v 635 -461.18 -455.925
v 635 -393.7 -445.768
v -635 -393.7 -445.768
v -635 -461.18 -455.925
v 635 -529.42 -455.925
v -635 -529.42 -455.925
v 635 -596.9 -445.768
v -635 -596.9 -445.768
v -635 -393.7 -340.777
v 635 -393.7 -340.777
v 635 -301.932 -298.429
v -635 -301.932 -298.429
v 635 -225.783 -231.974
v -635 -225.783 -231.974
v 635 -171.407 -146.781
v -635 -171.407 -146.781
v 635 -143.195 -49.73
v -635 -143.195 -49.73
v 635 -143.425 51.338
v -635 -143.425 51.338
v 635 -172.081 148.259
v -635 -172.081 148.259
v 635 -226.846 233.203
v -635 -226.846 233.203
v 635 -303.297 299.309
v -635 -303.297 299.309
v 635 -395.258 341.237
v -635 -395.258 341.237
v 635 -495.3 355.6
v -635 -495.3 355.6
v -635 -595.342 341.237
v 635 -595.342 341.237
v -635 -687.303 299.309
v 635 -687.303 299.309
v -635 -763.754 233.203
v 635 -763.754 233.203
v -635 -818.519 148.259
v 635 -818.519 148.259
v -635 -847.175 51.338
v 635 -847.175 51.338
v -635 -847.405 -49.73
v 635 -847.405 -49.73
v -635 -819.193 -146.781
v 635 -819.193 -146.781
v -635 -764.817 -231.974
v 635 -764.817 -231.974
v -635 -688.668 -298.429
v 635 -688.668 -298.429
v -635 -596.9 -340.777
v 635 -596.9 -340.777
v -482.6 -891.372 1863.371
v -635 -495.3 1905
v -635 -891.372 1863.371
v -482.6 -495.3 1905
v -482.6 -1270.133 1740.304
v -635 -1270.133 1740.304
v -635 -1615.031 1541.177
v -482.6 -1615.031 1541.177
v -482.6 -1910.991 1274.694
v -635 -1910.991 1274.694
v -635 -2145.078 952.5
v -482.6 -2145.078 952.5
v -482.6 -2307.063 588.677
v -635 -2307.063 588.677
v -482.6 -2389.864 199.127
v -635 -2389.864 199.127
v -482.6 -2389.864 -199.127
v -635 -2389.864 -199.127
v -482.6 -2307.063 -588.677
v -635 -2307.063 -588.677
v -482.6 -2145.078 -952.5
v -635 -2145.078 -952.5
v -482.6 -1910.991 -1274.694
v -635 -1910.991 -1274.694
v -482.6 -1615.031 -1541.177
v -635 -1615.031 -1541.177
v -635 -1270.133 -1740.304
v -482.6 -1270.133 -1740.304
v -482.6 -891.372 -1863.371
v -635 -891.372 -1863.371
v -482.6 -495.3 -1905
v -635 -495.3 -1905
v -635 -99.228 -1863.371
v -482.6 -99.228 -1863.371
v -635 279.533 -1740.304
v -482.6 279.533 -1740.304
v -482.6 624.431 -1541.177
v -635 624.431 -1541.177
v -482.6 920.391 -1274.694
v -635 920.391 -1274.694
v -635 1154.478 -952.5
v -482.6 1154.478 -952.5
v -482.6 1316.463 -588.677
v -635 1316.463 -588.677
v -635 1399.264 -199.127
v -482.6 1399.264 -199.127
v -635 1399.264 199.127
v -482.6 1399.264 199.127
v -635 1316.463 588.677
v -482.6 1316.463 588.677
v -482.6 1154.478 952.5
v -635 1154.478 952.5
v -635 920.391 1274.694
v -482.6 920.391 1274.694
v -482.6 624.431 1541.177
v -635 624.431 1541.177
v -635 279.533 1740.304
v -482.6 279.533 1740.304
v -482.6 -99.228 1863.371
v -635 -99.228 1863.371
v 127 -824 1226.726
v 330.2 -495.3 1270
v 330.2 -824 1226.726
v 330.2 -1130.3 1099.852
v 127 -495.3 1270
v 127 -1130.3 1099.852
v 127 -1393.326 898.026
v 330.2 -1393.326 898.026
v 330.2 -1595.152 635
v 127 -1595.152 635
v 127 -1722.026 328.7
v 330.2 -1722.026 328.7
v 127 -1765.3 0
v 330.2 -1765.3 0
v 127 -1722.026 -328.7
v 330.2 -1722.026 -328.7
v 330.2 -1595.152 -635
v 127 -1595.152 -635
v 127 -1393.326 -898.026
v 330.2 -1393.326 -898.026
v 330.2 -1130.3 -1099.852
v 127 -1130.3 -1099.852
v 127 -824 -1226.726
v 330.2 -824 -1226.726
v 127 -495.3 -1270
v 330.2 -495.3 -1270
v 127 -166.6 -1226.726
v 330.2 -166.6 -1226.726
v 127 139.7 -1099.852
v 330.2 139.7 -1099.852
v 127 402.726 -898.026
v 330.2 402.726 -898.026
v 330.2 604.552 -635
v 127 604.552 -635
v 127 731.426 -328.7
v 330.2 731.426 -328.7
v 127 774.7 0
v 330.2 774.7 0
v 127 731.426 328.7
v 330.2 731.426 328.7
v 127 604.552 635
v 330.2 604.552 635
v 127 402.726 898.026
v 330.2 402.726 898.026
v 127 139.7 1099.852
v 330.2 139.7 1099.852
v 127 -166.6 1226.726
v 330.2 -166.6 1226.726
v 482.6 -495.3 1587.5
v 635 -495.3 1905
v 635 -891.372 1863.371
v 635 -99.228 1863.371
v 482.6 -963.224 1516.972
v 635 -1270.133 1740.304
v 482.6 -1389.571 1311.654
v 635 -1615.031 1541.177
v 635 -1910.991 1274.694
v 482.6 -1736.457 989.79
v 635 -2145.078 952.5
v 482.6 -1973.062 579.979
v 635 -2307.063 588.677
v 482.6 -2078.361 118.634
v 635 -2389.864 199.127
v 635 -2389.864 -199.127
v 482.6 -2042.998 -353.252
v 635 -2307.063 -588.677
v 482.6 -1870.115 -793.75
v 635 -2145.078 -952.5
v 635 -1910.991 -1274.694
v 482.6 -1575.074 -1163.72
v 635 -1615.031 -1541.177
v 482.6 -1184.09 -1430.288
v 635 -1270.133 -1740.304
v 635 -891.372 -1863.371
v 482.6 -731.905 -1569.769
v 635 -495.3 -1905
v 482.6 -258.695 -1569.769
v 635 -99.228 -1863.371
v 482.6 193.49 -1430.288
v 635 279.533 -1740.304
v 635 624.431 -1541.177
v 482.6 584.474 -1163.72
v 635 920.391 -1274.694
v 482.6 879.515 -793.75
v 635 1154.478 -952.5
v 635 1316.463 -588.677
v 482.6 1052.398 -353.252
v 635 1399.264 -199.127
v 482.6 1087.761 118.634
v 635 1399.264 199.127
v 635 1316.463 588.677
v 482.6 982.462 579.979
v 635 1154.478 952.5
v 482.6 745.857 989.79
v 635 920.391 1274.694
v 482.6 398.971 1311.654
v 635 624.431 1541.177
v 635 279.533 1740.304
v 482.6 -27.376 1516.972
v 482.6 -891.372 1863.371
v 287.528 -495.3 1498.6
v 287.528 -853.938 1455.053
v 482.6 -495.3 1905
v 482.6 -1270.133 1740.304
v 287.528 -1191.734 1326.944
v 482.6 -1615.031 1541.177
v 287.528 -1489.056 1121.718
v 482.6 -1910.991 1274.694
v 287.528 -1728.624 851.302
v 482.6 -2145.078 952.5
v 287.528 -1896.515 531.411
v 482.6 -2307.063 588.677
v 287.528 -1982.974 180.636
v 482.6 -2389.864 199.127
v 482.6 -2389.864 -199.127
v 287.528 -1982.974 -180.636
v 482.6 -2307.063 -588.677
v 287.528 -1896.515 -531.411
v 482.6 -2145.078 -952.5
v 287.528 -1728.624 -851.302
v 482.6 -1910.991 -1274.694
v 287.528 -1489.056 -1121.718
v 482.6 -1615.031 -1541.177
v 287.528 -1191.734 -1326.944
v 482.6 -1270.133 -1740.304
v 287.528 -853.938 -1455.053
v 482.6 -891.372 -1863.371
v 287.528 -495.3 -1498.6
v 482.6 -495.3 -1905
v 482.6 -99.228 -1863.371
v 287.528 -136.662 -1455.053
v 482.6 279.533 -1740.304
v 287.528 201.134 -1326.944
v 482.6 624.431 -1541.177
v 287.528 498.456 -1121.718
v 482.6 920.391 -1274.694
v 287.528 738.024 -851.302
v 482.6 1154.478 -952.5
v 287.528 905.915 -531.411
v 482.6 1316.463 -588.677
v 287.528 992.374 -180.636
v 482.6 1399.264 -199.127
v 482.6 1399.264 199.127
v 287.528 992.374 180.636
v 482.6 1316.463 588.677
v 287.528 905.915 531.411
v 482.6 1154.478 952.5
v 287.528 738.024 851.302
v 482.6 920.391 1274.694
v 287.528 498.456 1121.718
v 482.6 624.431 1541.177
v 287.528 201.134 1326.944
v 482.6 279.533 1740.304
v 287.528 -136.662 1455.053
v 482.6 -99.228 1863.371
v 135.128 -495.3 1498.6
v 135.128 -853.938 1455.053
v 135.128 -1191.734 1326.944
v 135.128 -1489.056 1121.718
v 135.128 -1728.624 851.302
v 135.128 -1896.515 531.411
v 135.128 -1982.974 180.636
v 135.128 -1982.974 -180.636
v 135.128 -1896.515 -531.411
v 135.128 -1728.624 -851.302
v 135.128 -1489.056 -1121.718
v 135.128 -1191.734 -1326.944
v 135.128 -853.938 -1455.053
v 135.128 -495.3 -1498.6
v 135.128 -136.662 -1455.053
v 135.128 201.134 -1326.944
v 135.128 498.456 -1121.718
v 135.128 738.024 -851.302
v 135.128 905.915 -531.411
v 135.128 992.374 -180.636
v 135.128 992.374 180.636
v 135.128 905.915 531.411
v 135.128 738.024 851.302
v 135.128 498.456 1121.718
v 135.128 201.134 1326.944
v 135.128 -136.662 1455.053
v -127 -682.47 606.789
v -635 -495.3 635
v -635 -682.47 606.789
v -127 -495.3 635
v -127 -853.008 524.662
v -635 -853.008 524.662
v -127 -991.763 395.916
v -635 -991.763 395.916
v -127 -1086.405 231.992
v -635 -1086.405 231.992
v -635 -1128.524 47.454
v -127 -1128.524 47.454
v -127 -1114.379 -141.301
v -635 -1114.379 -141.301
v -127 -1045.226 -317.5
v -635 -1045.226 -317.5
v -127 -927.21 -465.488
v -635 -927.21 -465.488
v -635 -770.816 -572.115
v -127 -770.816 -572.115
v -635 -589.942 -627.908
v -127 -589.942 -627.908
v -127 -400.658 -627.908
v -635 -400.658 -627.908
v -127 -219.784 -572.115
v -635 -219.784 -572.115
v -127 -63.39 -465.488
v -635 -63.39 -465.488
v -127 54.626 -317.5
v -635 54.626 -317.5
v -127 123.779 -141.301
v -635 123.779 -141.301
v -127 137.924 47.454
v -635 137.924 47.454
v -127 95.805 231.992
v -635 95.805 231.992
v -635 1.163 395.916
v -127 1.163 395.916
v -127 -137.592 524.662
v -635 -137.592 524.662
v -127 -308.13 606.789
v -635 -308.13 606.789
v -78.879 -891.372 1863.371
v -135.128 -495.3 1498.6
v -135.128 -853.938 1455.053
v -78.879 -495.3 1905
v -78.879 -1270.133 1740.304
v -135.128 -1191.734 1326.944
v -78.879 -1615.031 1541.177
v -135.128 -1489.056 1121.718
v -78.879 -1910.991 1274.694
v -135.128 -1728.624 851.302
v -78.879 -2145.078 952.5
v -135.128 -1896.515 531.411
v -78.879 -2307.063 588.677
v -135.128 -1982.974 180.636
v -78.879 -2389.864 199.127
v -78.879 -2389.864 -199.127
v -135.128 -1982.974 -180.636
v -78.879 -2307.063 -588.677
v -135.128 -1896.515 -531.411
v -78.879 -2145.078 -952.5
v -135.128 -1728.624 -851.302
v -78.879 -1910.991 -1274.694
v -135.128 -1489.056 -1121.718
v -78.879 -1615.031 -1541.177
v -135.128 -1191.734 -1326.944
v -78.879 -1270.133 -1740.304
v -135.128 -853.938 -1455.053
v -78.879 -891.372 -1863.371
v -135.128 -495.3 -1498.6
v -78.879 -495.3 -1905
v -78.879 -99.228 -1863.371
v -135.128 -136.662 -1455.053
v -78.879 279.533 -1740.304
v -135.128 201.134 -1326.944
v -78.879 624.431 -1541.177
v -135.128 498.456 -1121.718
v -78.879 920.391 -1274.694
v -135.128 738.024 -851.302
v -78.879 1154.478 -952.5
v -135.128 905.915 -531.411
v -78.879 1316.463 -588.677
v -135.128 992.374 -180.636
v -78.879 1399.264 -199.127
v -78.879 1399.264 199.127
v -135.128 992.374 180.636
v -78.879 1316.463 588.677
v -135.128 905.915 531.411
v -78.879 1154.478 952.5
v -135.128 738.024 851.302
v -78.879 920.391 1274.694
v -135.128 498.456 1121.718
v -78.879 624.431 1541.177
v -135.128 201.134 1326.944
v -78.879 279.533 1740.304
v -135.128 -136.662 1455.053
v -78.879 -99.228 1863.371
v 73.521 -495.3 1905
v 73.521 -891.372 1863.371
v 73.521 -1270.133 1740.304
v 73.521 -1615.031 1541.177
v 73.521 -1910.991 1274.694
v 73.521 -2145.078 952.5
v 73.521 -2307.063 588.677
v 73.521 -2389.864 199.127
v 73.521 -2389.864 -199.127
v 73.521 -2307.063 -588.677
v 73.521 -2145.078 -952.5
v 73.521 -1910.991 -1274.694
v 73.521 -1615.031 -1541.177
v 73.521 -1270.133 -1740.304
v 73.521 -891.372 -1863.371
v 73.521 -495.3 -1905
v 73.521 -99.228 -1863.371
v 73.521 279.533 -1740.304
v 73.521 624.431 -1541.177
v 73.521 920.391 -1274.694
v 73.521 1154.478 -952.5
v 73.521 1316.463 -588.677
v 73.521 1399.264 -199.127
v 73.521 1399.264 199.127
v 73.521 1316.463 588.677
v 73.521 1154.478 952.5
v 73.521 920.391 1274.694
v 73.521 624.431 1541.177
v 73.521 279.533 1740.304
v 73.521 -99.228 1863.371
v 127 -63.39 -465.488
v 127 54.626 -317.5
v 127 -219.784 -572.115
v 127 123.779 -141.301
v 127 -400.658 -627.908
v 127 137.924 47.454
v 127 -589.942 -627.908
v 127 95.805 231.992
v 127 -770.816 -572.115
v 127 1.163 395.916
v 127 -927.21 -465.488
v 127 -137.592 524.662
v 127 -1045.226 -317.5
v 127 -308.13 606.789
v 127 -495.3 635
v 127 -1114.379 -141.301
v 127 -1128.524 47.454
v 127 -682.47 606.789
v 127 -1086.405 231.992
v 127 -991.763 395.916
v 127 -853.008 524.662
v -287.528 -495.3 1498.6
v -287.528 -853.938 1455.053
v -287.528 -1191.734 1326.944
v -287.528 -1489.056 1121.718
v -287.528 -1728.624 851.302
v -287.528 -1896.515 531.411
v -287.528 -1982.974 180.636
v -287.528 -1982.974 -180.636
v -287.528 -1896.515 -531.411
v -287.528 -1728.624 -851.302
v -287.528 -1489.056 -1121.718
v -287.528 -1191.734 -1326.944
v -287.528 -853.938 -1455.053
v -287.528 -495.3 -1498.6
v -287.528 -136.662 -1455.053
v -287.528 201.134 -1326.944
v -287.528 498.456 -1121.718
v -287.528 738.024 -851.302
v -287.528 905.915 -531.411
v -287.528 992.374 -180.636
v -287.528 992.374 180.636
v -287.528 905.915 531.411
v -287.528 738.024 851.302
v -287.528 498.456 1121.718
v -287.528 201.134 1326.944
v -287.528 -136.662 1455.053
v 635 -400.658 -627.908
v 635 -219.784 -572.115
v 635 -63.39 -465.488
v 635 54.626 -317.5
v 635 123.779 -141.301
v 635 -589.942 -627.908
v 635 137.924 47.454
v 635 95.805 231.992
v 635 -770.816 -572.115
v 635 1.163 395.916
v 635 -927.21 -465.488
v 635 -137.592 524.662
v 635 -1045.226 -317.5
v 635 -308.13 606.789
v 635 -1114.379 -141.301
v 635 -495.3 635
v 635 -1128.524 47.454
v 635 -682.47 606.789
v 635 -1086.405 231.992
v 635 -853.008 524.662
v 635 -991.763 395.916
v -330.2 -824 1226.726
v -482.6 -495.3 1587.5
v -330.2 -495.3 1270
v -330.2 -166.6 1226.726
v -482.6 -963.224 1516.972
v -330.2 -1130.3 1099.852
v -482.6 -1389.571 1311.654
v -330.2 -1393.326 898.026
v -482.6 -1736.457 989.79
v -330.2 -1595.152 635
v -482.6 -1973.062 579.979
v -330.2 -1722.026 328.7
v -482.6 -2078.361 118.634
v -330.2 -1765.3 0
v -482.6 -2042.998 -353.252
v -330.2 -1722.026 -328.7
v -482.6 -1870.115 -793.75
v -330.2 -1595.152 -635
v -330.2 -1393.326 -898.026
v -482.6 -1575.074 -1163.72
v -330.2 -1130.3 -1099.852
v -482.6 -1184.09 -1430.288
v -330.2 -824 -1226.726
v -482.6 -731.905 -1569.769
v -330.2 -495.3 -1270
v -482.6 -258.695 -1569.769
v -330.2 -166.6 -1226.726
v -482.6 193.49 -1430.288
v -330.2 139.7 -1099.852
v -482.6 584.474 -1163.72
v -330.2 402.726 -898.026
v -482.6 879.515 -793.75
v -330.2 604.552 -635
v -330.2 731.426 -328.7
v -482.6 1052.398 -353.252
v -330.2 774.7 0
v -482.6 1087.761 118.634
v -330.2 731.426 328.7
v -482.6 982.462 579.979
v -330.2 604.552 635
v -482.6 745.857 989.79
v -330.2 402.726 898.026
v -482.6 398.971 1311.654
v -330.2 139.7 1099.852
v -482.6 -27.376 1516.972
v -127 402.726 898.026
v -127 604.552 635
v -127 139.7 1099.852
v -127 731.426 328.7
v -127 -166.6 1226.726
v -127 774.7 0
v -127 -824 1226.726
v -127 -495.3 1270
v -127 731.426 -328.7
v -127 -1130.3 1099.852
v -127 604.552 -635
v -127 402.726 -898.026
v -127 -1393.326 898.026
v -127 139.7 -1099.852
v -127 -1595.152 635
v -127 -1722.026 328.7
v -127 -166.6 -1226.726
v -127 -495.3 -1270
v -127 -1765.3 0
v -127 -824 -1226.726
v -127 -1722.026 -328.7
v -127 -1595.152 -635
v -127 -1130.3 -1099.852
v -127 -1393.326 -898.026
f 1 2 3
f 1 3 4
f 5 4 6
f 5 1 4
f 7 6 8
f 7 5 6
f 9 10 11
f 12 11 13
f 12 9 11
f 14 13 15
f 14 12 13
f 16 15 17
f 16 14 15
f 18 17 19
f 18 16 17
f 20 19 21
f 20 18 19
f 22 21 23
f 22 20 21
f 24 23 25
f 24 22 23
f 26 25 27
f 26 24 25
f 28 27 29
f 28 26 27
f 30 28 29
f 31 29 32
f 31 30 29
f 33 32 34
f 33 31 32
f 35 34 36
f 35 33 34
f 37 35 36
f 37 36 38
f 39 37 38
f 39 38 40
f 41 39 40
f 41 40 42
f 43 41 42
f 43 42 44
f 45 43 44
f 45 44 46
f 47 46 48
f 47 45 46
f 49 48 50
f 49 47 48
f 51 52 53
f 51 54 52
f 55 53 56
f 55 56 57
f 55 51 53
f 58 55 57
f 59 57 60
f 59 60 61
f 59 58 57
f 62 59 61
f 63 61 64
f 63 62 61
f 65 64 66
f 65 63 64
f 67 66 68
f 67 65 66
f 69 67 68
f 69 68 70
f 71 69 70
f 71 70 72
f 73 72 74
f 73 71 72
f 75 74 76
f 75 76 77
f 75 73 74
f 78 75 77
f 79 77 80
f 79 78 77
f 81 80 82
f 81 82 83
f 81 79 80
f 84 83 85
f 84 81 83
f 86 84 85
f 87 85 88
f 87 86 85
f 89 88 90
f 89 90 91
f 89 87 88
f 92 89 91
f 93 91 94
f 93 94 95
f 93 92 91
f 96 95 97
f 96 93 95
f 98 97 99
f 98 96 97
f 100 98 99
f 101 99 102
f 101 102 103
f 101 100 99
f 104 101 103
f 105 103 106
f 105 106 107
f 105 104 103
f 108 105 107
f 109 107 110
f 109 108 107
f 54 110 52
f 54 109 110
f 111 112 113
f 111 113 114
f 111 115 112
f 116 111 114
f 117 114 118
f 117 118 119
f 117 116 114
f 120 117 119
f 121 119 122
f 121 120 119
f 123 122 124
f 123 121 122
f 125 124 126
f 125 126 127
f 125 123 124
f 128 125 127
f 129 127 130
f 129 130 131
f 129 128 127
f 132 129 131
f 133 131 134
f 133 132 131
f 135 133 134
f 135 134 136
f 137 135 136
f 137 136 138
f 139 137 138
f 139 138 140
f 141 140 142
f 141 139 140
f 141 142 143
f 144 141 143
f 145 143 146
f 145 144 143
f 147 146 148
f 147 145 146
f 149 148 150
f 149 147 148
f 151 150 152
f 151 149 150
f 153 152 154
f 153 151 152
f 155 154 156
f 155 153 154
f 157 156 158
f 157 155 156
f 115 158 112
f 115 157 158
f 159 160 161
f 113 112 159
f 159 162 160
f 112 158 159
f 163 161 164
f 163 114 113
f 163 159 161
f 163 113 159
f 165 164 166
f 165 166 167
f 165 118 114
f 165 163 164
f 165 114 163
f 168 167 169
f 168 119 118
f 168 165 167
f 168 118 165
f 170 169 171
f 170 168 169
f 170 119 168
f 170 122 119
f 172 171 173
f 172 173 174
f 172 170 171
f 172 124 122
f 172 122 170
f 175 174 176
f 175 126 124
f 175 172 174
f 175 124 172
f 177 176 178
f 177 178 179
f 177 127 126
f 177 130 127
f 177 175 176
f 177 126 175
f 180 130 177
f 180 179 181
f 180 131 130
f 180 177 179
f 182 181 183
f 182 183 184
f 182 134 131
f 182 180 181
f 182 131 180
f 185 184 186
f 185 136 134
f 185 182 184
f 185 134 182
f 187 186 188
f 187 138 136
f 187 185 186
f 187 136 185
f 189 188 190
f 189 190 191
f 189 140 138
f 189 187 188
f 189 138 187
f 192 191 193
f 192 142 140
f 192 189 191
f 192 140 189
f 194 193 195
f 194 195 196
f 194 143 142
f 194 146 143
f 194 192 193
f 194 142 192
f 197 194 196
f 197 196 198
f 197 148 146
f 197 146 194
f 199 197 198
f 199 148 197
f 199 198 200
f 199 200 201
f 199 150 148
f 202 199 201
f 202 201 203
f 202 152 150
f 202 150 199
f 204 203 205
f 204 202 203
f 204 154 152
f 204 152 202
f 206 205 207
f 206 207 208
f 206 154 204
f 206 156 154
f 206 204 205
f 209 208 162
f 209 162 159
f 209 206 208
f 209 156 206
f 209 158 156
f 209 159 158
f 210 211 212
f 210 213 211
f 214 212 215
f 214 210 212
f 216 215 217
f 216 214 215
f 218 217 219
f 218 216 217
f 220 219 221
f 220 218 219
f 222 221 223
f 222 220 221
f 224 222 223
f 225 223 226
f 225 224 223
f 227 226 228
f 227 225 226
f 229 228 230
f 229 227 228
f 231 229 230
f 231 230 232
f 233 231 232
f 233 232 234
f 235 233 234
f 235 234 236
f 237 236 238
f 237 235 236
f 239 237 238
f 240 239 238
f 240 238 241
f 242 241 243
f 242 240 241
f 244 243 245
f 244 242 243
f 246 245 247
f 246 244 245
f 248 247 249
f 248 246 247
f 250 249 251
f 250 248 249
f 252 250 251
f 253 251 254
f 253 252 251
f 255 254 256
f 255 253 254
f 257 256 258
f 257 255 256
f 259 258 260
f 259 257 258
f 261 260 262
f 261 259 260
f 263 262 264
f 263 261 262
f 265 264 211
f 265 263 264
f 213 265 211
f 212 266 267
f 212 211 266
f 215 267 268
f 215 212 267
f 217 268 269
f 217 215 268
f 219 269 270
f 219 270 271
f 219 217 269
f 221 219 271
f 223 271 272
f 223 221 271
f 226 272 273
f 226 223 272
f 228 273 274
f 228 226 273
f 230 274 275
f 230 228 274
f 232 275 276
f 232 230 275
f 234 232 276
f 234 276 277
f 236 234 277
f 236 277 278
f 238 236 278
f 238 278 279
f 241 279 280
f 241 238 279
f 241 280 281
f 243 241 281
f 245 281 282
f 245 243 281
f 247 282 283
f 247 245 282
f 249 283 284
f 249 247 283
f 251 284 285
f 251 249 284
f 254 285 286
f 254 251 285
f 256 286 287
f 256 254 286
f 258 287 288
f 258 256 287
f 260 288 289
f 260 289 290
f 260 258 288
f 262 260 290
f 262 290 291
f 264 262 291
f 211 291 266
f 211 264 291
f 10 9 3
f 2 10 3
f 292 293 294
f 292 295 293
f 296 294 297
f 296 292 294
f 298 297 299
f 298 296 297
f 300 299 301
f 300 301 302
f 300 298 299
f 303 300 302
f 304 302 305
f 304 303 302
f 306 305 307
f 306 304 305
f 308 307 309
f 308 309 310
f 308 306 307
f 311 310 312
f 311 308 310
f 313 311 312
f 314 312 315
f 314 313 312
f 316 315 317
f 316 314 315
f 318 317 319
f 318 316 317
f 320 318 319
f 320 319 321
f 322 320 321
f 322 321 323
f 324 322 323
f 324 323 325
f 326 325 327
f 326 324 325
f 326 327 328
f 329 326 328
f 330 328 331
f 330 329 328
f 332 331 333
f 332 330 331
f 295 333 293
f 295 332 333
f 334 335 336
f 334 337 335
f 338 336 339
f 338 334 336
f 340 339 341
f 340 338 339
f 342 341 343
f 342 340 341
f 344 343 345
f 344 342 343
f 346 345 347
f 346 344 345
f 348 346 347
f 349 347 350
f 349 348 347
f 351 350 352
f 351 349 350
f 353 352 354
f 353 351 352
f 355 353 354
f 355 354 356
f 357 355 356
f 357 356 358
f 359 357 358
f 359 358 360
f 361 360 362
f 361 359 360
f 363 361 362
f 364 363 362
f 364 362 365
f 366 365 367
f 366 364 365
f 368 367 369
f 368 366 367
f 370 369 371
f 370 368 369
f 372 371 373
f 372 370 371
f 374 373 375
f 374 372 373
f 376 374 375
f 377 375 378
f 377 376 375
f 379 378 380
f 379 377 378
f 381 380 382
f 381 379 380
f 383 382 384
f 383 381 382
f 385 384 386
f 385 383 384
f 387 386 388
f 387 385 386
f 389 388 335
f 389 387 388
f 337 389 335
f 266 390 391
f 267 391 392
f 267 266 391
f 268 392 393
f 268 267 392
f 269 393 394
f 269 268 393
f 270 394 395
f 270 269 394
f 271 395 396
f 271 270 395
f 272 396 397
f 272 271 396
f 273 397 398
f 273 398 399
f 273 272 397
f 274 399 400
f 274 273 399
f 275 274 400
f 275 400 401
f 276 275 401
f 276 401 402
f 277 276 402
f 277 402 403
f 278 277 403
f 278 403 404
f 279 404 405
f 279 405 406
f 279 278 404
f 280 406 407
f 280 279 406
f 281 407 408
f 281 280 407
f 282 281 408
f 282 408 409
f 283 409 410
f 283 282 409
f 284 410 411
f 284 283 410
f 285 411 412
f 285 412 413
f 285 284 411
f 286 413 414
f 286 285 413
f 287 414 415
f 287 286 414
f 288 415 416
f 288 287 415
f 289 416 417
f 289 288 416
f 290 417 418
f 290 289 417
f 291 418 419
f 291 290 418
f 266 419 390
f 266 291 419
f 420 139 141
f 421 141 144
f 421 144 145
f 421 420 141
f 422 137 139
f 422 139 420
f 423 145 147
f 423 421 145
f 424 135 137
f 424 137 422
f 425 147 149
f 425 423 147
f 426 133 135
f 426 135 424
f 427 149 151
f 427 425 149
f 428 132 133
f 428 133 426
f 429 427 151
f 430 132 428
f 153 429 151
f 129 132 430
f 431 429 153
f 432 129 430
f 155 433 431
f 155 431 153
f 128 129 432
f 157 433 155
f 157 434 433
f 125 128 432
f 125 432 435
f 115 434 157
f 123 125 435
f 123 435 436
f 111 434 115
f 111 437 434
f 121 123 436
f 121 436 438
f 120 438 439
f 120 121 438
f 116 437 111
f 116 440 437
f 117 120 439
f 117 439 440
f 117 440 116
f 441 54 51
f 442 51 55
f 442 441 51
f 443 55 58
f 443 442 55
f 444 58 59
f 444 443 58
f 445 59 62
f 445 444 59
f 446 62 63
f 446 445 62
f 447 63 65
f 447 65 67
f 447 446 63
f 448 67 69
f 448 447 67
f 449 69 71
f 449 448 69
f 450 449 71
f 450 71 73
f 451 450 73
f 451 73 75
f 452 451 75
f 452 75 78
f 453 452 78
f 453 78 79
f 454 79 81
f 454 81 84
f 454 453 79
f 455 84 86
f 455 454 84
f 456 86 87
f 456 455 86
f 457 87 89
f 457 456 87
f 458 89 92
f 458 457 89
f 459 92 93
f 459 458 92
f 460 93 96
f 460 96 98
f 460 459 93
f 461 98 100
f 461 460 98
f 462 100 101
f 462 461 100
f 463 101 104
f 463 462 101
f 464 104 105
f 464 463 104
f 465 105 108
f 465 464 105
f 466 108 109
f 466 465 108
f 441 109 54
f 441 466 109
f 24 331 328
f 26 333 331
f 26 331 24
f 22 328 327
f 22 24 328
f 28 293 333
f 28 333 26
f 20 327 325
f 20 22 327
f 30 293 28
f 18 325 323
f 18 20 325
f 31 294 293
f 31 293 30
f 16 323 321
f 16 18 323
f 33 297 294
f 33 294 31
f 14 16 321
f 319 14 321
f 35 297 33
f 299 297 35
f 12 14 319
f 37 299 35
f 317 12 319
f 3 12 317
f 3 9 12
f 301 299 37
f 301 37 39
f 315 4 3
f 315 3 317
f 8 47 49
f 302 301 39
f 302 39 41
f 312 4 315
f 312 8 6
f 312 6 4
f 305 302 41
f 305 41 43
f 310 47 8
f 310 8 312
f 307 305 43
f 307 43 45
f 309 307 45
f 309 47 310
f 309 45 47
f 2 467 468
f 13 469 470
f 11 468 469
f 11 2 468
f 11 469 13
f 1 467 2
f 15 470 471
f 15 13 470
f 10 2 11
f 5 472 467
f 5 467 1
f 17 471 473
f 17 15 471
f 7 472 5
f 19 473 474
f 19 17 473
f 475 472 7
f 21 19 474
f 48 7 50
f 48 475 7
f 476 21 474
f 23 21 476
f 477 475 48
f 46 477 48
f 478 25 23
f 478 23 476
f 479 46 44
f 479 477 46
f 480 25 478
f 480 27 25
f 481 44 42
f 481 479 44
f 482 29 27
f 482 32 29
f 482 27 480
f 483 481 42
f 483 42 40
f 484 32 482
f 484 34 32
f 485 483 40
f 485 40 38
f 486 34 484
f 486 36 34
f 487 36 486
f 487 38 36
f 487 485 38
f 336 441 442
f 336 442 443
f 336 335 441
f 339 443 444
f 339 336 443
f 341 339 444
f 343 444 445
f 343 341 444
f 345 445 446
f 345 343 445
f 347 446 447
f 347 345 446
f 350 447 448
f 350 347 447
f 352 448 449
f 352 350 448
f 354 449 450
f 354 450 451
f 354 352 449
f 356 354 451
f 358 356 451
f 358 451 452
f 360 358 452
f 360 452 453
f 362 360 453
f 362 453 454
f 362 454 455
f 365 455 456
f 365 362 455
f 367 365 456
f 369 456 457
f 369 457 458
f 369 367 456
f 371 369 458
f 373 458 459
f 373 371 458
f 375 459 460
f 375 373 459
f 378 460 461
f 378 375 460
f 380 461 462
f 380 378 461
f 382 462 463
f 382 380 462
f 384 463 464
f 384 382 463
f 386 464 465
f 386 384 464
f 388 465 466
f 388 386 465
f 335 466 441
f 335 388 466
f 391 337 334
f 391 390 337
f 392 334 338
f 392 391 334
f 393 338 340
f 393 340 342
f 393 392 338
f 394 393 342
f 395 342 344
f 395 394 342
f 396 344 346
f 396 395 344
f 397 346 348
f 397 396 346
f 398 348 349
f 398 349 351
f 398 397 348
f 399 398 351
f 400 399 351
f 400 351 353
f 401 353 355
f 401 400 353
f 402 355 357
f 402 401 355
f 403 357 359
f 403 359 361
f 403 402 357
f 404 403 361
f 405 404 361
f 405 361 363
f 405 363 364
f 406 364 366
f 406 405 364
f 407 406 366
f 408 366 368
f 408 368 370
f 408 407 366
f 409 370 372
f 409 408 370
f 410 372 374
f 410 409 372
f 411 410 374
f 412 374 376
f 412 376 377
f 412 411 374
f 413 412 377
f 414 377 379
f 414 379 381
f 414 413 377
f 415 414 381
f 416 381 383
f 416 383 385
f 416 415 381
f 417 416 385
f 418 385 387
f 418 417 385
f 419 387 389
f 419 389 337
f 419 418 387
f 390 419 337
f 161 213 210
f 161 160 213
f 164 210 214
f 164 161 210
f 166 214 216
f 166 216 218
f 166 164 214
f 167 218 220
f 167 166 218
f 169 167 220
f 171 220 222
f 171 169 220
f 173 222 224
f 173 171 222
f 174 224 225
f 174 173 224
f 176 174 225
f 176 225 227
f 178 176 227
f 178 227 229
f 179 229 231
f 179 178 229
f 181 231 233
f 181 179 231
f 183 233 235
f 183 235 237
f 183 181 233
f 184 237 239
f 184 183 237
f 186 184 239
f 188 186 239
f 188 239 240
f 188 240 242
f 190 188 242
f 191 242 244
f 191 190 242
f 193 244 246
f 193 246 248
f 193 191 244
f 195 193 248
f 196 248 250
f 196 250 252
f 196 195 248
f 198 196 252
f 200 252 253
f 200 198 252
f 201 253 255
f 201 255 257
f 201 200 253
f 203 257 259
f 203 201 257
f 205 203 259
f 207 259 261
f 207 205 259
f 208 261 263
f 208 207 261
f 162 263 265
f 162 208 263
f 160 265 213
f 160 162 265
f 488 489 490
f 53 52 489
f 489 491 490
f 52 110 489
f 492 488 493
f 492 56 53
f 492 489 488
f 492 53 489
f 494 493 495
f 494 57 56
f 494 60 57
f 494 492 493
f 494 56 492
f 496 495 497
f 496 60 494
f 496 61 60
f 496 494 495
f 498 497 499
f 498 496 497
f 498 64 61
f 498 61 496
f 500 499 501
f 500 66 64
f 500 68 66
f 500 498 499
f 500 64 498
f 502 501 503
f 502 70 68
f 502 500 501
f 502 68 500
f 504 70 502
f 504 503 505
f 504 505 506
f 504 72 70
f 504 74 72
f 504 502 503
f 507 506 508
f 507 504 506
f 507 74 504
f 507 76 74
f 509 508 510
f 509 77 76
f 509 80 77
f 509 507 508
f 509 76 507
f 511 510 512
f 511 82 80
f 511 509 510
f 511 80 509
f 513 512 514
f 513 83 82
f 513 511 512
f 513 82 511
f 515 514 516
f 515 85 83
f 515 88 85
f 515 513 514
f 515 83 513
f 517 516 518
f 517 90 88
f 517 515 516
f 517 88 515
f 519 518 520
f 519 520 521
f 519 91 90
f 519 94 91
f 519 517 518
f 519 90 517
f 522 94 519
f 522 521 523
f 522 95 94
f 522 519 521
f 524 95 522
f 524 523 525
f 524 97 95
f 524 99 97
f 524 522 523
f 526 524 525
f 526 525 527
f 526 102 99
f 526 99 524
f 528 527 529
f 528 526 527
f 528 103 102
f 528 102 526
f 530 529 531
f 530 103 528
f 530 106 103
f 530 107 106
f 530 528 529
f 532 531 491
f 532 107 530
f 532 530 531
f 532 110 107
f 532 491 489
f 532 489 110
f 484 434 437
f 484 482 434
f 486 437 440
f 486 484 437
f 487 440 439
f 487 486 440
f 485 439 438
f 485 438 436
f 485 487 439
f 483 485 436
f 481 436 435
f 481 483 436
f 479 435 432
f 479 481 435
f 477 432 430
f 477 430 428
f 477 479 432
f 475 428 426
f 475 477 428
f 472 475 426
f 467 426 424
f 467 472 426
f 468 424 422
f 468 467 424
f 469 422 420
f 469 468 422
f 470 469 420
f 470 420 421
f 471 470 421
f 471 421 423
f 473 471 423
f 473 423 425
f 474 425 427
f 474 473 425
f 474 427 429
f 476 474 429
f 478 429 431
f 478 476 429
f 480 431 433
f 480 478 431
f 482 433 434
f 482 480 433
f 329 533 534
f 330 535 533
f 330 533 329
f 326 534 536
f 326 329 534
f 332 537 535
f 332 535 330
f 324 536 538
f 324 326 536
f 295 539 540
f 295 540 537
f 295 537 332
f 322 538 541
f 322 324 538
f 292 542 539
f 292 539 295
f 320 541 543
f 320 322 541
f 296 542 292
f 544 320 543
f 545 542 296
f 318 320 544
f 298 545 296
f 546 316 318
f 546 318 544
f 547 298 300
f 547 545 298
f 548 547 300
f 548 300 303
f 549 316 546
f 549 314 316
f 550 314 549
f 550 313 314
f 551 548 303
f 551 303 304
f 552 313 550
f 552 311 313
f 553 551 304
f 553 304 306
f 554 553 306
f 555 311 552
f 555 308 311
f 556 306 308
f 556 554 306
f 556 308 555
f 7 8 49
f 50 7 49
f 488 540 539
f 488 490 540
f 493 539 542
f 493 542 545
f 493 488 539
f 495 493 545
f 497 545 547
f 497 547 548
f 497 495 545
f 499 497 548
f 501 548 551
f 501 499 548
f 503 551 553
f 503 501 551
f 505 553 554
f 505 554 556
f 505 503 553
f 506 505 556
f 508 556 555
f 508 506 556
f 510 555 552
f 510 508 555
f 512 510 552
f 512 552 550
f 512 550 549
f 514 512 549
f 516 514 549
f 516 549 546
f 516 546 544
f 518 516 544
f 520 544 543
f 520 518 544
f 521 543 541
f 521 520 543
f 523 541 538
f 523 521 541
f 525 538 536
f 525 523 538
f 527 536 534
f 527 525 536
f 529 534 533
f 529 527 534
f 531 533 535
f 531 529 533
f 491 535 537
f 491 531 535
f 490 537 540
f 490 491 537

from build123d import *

# Parameters (mm, degrees)
CORTAR_EXTRUIR2_REACH = 3319.132


with BuildPart() as part:
    # Croquis3 → Revolución1 (revolve)
    with BuildSketch(Plane.XY, mode=Mode.PRIVATE) as revoluci_n1_sk:
        Polygon((-127, 139.7), (-127, 774.7), (-330.2, 774.7), (-635, 1409.7), (-482.6, 1409.7), (-287.528, 1003.3), (-135.128, 1003.3), (-78.878549621, 1409.7), (73.521450379, 1409.7), (135.128, 1003.3), (287.528, 1003.3), (482.6, 1409.7), (635, 1409.7), (330.2, 774.7), (127, 774.7), (127, 139.7), (635, 139.7), (635, -139.7), (-635, -139.7), (-635, 139.7), align=None)
    revolve(revoluci_n1_sk.sketch.rotate(Axis((-757.808630679, -495.3, 0), (1, 0, 0)), 90), axis=Axis((-757.808630679, -495.3, 0), (1, 0, 0)))

    # Croquis4 → Cortar-Extruir2 (cut, up to next)
    with BuildSketch(Plane(origin=(635, 0, 0), x_dir=(0, 0, -1), z_dir=(1, 0, 0)), mode=Mode.PRIVATE) as cortar_extruir2_sk1:
        with BuildLine():
            Line((340.776759771, -393.7), (445.76819088, -393.7))
            ThreePointArc((445.76819088, -393.7), (457.2, -495.3), (445.76819088, -596.9))
            Line((445.76819088, -596.9), (340.776759771, -596.9))
            ThreePointArc((340.776759771, -596.9), (355.6, -495.3), (340.776759771, -393.7))
        make_face()
    cortar_extruir2_tool1 = extrude(cortar_extruir2_sk1.sketch, amount=-CORTAR_EXTRUIR2_REACH, mode=Mode.PRIVATE) & part.part
    add(cortar_extruir2_tool1.solids().sort_by_distance((635, -495.3, -402.016611))[0], mode=Mode.SUBTRACT)


solid = part.part
